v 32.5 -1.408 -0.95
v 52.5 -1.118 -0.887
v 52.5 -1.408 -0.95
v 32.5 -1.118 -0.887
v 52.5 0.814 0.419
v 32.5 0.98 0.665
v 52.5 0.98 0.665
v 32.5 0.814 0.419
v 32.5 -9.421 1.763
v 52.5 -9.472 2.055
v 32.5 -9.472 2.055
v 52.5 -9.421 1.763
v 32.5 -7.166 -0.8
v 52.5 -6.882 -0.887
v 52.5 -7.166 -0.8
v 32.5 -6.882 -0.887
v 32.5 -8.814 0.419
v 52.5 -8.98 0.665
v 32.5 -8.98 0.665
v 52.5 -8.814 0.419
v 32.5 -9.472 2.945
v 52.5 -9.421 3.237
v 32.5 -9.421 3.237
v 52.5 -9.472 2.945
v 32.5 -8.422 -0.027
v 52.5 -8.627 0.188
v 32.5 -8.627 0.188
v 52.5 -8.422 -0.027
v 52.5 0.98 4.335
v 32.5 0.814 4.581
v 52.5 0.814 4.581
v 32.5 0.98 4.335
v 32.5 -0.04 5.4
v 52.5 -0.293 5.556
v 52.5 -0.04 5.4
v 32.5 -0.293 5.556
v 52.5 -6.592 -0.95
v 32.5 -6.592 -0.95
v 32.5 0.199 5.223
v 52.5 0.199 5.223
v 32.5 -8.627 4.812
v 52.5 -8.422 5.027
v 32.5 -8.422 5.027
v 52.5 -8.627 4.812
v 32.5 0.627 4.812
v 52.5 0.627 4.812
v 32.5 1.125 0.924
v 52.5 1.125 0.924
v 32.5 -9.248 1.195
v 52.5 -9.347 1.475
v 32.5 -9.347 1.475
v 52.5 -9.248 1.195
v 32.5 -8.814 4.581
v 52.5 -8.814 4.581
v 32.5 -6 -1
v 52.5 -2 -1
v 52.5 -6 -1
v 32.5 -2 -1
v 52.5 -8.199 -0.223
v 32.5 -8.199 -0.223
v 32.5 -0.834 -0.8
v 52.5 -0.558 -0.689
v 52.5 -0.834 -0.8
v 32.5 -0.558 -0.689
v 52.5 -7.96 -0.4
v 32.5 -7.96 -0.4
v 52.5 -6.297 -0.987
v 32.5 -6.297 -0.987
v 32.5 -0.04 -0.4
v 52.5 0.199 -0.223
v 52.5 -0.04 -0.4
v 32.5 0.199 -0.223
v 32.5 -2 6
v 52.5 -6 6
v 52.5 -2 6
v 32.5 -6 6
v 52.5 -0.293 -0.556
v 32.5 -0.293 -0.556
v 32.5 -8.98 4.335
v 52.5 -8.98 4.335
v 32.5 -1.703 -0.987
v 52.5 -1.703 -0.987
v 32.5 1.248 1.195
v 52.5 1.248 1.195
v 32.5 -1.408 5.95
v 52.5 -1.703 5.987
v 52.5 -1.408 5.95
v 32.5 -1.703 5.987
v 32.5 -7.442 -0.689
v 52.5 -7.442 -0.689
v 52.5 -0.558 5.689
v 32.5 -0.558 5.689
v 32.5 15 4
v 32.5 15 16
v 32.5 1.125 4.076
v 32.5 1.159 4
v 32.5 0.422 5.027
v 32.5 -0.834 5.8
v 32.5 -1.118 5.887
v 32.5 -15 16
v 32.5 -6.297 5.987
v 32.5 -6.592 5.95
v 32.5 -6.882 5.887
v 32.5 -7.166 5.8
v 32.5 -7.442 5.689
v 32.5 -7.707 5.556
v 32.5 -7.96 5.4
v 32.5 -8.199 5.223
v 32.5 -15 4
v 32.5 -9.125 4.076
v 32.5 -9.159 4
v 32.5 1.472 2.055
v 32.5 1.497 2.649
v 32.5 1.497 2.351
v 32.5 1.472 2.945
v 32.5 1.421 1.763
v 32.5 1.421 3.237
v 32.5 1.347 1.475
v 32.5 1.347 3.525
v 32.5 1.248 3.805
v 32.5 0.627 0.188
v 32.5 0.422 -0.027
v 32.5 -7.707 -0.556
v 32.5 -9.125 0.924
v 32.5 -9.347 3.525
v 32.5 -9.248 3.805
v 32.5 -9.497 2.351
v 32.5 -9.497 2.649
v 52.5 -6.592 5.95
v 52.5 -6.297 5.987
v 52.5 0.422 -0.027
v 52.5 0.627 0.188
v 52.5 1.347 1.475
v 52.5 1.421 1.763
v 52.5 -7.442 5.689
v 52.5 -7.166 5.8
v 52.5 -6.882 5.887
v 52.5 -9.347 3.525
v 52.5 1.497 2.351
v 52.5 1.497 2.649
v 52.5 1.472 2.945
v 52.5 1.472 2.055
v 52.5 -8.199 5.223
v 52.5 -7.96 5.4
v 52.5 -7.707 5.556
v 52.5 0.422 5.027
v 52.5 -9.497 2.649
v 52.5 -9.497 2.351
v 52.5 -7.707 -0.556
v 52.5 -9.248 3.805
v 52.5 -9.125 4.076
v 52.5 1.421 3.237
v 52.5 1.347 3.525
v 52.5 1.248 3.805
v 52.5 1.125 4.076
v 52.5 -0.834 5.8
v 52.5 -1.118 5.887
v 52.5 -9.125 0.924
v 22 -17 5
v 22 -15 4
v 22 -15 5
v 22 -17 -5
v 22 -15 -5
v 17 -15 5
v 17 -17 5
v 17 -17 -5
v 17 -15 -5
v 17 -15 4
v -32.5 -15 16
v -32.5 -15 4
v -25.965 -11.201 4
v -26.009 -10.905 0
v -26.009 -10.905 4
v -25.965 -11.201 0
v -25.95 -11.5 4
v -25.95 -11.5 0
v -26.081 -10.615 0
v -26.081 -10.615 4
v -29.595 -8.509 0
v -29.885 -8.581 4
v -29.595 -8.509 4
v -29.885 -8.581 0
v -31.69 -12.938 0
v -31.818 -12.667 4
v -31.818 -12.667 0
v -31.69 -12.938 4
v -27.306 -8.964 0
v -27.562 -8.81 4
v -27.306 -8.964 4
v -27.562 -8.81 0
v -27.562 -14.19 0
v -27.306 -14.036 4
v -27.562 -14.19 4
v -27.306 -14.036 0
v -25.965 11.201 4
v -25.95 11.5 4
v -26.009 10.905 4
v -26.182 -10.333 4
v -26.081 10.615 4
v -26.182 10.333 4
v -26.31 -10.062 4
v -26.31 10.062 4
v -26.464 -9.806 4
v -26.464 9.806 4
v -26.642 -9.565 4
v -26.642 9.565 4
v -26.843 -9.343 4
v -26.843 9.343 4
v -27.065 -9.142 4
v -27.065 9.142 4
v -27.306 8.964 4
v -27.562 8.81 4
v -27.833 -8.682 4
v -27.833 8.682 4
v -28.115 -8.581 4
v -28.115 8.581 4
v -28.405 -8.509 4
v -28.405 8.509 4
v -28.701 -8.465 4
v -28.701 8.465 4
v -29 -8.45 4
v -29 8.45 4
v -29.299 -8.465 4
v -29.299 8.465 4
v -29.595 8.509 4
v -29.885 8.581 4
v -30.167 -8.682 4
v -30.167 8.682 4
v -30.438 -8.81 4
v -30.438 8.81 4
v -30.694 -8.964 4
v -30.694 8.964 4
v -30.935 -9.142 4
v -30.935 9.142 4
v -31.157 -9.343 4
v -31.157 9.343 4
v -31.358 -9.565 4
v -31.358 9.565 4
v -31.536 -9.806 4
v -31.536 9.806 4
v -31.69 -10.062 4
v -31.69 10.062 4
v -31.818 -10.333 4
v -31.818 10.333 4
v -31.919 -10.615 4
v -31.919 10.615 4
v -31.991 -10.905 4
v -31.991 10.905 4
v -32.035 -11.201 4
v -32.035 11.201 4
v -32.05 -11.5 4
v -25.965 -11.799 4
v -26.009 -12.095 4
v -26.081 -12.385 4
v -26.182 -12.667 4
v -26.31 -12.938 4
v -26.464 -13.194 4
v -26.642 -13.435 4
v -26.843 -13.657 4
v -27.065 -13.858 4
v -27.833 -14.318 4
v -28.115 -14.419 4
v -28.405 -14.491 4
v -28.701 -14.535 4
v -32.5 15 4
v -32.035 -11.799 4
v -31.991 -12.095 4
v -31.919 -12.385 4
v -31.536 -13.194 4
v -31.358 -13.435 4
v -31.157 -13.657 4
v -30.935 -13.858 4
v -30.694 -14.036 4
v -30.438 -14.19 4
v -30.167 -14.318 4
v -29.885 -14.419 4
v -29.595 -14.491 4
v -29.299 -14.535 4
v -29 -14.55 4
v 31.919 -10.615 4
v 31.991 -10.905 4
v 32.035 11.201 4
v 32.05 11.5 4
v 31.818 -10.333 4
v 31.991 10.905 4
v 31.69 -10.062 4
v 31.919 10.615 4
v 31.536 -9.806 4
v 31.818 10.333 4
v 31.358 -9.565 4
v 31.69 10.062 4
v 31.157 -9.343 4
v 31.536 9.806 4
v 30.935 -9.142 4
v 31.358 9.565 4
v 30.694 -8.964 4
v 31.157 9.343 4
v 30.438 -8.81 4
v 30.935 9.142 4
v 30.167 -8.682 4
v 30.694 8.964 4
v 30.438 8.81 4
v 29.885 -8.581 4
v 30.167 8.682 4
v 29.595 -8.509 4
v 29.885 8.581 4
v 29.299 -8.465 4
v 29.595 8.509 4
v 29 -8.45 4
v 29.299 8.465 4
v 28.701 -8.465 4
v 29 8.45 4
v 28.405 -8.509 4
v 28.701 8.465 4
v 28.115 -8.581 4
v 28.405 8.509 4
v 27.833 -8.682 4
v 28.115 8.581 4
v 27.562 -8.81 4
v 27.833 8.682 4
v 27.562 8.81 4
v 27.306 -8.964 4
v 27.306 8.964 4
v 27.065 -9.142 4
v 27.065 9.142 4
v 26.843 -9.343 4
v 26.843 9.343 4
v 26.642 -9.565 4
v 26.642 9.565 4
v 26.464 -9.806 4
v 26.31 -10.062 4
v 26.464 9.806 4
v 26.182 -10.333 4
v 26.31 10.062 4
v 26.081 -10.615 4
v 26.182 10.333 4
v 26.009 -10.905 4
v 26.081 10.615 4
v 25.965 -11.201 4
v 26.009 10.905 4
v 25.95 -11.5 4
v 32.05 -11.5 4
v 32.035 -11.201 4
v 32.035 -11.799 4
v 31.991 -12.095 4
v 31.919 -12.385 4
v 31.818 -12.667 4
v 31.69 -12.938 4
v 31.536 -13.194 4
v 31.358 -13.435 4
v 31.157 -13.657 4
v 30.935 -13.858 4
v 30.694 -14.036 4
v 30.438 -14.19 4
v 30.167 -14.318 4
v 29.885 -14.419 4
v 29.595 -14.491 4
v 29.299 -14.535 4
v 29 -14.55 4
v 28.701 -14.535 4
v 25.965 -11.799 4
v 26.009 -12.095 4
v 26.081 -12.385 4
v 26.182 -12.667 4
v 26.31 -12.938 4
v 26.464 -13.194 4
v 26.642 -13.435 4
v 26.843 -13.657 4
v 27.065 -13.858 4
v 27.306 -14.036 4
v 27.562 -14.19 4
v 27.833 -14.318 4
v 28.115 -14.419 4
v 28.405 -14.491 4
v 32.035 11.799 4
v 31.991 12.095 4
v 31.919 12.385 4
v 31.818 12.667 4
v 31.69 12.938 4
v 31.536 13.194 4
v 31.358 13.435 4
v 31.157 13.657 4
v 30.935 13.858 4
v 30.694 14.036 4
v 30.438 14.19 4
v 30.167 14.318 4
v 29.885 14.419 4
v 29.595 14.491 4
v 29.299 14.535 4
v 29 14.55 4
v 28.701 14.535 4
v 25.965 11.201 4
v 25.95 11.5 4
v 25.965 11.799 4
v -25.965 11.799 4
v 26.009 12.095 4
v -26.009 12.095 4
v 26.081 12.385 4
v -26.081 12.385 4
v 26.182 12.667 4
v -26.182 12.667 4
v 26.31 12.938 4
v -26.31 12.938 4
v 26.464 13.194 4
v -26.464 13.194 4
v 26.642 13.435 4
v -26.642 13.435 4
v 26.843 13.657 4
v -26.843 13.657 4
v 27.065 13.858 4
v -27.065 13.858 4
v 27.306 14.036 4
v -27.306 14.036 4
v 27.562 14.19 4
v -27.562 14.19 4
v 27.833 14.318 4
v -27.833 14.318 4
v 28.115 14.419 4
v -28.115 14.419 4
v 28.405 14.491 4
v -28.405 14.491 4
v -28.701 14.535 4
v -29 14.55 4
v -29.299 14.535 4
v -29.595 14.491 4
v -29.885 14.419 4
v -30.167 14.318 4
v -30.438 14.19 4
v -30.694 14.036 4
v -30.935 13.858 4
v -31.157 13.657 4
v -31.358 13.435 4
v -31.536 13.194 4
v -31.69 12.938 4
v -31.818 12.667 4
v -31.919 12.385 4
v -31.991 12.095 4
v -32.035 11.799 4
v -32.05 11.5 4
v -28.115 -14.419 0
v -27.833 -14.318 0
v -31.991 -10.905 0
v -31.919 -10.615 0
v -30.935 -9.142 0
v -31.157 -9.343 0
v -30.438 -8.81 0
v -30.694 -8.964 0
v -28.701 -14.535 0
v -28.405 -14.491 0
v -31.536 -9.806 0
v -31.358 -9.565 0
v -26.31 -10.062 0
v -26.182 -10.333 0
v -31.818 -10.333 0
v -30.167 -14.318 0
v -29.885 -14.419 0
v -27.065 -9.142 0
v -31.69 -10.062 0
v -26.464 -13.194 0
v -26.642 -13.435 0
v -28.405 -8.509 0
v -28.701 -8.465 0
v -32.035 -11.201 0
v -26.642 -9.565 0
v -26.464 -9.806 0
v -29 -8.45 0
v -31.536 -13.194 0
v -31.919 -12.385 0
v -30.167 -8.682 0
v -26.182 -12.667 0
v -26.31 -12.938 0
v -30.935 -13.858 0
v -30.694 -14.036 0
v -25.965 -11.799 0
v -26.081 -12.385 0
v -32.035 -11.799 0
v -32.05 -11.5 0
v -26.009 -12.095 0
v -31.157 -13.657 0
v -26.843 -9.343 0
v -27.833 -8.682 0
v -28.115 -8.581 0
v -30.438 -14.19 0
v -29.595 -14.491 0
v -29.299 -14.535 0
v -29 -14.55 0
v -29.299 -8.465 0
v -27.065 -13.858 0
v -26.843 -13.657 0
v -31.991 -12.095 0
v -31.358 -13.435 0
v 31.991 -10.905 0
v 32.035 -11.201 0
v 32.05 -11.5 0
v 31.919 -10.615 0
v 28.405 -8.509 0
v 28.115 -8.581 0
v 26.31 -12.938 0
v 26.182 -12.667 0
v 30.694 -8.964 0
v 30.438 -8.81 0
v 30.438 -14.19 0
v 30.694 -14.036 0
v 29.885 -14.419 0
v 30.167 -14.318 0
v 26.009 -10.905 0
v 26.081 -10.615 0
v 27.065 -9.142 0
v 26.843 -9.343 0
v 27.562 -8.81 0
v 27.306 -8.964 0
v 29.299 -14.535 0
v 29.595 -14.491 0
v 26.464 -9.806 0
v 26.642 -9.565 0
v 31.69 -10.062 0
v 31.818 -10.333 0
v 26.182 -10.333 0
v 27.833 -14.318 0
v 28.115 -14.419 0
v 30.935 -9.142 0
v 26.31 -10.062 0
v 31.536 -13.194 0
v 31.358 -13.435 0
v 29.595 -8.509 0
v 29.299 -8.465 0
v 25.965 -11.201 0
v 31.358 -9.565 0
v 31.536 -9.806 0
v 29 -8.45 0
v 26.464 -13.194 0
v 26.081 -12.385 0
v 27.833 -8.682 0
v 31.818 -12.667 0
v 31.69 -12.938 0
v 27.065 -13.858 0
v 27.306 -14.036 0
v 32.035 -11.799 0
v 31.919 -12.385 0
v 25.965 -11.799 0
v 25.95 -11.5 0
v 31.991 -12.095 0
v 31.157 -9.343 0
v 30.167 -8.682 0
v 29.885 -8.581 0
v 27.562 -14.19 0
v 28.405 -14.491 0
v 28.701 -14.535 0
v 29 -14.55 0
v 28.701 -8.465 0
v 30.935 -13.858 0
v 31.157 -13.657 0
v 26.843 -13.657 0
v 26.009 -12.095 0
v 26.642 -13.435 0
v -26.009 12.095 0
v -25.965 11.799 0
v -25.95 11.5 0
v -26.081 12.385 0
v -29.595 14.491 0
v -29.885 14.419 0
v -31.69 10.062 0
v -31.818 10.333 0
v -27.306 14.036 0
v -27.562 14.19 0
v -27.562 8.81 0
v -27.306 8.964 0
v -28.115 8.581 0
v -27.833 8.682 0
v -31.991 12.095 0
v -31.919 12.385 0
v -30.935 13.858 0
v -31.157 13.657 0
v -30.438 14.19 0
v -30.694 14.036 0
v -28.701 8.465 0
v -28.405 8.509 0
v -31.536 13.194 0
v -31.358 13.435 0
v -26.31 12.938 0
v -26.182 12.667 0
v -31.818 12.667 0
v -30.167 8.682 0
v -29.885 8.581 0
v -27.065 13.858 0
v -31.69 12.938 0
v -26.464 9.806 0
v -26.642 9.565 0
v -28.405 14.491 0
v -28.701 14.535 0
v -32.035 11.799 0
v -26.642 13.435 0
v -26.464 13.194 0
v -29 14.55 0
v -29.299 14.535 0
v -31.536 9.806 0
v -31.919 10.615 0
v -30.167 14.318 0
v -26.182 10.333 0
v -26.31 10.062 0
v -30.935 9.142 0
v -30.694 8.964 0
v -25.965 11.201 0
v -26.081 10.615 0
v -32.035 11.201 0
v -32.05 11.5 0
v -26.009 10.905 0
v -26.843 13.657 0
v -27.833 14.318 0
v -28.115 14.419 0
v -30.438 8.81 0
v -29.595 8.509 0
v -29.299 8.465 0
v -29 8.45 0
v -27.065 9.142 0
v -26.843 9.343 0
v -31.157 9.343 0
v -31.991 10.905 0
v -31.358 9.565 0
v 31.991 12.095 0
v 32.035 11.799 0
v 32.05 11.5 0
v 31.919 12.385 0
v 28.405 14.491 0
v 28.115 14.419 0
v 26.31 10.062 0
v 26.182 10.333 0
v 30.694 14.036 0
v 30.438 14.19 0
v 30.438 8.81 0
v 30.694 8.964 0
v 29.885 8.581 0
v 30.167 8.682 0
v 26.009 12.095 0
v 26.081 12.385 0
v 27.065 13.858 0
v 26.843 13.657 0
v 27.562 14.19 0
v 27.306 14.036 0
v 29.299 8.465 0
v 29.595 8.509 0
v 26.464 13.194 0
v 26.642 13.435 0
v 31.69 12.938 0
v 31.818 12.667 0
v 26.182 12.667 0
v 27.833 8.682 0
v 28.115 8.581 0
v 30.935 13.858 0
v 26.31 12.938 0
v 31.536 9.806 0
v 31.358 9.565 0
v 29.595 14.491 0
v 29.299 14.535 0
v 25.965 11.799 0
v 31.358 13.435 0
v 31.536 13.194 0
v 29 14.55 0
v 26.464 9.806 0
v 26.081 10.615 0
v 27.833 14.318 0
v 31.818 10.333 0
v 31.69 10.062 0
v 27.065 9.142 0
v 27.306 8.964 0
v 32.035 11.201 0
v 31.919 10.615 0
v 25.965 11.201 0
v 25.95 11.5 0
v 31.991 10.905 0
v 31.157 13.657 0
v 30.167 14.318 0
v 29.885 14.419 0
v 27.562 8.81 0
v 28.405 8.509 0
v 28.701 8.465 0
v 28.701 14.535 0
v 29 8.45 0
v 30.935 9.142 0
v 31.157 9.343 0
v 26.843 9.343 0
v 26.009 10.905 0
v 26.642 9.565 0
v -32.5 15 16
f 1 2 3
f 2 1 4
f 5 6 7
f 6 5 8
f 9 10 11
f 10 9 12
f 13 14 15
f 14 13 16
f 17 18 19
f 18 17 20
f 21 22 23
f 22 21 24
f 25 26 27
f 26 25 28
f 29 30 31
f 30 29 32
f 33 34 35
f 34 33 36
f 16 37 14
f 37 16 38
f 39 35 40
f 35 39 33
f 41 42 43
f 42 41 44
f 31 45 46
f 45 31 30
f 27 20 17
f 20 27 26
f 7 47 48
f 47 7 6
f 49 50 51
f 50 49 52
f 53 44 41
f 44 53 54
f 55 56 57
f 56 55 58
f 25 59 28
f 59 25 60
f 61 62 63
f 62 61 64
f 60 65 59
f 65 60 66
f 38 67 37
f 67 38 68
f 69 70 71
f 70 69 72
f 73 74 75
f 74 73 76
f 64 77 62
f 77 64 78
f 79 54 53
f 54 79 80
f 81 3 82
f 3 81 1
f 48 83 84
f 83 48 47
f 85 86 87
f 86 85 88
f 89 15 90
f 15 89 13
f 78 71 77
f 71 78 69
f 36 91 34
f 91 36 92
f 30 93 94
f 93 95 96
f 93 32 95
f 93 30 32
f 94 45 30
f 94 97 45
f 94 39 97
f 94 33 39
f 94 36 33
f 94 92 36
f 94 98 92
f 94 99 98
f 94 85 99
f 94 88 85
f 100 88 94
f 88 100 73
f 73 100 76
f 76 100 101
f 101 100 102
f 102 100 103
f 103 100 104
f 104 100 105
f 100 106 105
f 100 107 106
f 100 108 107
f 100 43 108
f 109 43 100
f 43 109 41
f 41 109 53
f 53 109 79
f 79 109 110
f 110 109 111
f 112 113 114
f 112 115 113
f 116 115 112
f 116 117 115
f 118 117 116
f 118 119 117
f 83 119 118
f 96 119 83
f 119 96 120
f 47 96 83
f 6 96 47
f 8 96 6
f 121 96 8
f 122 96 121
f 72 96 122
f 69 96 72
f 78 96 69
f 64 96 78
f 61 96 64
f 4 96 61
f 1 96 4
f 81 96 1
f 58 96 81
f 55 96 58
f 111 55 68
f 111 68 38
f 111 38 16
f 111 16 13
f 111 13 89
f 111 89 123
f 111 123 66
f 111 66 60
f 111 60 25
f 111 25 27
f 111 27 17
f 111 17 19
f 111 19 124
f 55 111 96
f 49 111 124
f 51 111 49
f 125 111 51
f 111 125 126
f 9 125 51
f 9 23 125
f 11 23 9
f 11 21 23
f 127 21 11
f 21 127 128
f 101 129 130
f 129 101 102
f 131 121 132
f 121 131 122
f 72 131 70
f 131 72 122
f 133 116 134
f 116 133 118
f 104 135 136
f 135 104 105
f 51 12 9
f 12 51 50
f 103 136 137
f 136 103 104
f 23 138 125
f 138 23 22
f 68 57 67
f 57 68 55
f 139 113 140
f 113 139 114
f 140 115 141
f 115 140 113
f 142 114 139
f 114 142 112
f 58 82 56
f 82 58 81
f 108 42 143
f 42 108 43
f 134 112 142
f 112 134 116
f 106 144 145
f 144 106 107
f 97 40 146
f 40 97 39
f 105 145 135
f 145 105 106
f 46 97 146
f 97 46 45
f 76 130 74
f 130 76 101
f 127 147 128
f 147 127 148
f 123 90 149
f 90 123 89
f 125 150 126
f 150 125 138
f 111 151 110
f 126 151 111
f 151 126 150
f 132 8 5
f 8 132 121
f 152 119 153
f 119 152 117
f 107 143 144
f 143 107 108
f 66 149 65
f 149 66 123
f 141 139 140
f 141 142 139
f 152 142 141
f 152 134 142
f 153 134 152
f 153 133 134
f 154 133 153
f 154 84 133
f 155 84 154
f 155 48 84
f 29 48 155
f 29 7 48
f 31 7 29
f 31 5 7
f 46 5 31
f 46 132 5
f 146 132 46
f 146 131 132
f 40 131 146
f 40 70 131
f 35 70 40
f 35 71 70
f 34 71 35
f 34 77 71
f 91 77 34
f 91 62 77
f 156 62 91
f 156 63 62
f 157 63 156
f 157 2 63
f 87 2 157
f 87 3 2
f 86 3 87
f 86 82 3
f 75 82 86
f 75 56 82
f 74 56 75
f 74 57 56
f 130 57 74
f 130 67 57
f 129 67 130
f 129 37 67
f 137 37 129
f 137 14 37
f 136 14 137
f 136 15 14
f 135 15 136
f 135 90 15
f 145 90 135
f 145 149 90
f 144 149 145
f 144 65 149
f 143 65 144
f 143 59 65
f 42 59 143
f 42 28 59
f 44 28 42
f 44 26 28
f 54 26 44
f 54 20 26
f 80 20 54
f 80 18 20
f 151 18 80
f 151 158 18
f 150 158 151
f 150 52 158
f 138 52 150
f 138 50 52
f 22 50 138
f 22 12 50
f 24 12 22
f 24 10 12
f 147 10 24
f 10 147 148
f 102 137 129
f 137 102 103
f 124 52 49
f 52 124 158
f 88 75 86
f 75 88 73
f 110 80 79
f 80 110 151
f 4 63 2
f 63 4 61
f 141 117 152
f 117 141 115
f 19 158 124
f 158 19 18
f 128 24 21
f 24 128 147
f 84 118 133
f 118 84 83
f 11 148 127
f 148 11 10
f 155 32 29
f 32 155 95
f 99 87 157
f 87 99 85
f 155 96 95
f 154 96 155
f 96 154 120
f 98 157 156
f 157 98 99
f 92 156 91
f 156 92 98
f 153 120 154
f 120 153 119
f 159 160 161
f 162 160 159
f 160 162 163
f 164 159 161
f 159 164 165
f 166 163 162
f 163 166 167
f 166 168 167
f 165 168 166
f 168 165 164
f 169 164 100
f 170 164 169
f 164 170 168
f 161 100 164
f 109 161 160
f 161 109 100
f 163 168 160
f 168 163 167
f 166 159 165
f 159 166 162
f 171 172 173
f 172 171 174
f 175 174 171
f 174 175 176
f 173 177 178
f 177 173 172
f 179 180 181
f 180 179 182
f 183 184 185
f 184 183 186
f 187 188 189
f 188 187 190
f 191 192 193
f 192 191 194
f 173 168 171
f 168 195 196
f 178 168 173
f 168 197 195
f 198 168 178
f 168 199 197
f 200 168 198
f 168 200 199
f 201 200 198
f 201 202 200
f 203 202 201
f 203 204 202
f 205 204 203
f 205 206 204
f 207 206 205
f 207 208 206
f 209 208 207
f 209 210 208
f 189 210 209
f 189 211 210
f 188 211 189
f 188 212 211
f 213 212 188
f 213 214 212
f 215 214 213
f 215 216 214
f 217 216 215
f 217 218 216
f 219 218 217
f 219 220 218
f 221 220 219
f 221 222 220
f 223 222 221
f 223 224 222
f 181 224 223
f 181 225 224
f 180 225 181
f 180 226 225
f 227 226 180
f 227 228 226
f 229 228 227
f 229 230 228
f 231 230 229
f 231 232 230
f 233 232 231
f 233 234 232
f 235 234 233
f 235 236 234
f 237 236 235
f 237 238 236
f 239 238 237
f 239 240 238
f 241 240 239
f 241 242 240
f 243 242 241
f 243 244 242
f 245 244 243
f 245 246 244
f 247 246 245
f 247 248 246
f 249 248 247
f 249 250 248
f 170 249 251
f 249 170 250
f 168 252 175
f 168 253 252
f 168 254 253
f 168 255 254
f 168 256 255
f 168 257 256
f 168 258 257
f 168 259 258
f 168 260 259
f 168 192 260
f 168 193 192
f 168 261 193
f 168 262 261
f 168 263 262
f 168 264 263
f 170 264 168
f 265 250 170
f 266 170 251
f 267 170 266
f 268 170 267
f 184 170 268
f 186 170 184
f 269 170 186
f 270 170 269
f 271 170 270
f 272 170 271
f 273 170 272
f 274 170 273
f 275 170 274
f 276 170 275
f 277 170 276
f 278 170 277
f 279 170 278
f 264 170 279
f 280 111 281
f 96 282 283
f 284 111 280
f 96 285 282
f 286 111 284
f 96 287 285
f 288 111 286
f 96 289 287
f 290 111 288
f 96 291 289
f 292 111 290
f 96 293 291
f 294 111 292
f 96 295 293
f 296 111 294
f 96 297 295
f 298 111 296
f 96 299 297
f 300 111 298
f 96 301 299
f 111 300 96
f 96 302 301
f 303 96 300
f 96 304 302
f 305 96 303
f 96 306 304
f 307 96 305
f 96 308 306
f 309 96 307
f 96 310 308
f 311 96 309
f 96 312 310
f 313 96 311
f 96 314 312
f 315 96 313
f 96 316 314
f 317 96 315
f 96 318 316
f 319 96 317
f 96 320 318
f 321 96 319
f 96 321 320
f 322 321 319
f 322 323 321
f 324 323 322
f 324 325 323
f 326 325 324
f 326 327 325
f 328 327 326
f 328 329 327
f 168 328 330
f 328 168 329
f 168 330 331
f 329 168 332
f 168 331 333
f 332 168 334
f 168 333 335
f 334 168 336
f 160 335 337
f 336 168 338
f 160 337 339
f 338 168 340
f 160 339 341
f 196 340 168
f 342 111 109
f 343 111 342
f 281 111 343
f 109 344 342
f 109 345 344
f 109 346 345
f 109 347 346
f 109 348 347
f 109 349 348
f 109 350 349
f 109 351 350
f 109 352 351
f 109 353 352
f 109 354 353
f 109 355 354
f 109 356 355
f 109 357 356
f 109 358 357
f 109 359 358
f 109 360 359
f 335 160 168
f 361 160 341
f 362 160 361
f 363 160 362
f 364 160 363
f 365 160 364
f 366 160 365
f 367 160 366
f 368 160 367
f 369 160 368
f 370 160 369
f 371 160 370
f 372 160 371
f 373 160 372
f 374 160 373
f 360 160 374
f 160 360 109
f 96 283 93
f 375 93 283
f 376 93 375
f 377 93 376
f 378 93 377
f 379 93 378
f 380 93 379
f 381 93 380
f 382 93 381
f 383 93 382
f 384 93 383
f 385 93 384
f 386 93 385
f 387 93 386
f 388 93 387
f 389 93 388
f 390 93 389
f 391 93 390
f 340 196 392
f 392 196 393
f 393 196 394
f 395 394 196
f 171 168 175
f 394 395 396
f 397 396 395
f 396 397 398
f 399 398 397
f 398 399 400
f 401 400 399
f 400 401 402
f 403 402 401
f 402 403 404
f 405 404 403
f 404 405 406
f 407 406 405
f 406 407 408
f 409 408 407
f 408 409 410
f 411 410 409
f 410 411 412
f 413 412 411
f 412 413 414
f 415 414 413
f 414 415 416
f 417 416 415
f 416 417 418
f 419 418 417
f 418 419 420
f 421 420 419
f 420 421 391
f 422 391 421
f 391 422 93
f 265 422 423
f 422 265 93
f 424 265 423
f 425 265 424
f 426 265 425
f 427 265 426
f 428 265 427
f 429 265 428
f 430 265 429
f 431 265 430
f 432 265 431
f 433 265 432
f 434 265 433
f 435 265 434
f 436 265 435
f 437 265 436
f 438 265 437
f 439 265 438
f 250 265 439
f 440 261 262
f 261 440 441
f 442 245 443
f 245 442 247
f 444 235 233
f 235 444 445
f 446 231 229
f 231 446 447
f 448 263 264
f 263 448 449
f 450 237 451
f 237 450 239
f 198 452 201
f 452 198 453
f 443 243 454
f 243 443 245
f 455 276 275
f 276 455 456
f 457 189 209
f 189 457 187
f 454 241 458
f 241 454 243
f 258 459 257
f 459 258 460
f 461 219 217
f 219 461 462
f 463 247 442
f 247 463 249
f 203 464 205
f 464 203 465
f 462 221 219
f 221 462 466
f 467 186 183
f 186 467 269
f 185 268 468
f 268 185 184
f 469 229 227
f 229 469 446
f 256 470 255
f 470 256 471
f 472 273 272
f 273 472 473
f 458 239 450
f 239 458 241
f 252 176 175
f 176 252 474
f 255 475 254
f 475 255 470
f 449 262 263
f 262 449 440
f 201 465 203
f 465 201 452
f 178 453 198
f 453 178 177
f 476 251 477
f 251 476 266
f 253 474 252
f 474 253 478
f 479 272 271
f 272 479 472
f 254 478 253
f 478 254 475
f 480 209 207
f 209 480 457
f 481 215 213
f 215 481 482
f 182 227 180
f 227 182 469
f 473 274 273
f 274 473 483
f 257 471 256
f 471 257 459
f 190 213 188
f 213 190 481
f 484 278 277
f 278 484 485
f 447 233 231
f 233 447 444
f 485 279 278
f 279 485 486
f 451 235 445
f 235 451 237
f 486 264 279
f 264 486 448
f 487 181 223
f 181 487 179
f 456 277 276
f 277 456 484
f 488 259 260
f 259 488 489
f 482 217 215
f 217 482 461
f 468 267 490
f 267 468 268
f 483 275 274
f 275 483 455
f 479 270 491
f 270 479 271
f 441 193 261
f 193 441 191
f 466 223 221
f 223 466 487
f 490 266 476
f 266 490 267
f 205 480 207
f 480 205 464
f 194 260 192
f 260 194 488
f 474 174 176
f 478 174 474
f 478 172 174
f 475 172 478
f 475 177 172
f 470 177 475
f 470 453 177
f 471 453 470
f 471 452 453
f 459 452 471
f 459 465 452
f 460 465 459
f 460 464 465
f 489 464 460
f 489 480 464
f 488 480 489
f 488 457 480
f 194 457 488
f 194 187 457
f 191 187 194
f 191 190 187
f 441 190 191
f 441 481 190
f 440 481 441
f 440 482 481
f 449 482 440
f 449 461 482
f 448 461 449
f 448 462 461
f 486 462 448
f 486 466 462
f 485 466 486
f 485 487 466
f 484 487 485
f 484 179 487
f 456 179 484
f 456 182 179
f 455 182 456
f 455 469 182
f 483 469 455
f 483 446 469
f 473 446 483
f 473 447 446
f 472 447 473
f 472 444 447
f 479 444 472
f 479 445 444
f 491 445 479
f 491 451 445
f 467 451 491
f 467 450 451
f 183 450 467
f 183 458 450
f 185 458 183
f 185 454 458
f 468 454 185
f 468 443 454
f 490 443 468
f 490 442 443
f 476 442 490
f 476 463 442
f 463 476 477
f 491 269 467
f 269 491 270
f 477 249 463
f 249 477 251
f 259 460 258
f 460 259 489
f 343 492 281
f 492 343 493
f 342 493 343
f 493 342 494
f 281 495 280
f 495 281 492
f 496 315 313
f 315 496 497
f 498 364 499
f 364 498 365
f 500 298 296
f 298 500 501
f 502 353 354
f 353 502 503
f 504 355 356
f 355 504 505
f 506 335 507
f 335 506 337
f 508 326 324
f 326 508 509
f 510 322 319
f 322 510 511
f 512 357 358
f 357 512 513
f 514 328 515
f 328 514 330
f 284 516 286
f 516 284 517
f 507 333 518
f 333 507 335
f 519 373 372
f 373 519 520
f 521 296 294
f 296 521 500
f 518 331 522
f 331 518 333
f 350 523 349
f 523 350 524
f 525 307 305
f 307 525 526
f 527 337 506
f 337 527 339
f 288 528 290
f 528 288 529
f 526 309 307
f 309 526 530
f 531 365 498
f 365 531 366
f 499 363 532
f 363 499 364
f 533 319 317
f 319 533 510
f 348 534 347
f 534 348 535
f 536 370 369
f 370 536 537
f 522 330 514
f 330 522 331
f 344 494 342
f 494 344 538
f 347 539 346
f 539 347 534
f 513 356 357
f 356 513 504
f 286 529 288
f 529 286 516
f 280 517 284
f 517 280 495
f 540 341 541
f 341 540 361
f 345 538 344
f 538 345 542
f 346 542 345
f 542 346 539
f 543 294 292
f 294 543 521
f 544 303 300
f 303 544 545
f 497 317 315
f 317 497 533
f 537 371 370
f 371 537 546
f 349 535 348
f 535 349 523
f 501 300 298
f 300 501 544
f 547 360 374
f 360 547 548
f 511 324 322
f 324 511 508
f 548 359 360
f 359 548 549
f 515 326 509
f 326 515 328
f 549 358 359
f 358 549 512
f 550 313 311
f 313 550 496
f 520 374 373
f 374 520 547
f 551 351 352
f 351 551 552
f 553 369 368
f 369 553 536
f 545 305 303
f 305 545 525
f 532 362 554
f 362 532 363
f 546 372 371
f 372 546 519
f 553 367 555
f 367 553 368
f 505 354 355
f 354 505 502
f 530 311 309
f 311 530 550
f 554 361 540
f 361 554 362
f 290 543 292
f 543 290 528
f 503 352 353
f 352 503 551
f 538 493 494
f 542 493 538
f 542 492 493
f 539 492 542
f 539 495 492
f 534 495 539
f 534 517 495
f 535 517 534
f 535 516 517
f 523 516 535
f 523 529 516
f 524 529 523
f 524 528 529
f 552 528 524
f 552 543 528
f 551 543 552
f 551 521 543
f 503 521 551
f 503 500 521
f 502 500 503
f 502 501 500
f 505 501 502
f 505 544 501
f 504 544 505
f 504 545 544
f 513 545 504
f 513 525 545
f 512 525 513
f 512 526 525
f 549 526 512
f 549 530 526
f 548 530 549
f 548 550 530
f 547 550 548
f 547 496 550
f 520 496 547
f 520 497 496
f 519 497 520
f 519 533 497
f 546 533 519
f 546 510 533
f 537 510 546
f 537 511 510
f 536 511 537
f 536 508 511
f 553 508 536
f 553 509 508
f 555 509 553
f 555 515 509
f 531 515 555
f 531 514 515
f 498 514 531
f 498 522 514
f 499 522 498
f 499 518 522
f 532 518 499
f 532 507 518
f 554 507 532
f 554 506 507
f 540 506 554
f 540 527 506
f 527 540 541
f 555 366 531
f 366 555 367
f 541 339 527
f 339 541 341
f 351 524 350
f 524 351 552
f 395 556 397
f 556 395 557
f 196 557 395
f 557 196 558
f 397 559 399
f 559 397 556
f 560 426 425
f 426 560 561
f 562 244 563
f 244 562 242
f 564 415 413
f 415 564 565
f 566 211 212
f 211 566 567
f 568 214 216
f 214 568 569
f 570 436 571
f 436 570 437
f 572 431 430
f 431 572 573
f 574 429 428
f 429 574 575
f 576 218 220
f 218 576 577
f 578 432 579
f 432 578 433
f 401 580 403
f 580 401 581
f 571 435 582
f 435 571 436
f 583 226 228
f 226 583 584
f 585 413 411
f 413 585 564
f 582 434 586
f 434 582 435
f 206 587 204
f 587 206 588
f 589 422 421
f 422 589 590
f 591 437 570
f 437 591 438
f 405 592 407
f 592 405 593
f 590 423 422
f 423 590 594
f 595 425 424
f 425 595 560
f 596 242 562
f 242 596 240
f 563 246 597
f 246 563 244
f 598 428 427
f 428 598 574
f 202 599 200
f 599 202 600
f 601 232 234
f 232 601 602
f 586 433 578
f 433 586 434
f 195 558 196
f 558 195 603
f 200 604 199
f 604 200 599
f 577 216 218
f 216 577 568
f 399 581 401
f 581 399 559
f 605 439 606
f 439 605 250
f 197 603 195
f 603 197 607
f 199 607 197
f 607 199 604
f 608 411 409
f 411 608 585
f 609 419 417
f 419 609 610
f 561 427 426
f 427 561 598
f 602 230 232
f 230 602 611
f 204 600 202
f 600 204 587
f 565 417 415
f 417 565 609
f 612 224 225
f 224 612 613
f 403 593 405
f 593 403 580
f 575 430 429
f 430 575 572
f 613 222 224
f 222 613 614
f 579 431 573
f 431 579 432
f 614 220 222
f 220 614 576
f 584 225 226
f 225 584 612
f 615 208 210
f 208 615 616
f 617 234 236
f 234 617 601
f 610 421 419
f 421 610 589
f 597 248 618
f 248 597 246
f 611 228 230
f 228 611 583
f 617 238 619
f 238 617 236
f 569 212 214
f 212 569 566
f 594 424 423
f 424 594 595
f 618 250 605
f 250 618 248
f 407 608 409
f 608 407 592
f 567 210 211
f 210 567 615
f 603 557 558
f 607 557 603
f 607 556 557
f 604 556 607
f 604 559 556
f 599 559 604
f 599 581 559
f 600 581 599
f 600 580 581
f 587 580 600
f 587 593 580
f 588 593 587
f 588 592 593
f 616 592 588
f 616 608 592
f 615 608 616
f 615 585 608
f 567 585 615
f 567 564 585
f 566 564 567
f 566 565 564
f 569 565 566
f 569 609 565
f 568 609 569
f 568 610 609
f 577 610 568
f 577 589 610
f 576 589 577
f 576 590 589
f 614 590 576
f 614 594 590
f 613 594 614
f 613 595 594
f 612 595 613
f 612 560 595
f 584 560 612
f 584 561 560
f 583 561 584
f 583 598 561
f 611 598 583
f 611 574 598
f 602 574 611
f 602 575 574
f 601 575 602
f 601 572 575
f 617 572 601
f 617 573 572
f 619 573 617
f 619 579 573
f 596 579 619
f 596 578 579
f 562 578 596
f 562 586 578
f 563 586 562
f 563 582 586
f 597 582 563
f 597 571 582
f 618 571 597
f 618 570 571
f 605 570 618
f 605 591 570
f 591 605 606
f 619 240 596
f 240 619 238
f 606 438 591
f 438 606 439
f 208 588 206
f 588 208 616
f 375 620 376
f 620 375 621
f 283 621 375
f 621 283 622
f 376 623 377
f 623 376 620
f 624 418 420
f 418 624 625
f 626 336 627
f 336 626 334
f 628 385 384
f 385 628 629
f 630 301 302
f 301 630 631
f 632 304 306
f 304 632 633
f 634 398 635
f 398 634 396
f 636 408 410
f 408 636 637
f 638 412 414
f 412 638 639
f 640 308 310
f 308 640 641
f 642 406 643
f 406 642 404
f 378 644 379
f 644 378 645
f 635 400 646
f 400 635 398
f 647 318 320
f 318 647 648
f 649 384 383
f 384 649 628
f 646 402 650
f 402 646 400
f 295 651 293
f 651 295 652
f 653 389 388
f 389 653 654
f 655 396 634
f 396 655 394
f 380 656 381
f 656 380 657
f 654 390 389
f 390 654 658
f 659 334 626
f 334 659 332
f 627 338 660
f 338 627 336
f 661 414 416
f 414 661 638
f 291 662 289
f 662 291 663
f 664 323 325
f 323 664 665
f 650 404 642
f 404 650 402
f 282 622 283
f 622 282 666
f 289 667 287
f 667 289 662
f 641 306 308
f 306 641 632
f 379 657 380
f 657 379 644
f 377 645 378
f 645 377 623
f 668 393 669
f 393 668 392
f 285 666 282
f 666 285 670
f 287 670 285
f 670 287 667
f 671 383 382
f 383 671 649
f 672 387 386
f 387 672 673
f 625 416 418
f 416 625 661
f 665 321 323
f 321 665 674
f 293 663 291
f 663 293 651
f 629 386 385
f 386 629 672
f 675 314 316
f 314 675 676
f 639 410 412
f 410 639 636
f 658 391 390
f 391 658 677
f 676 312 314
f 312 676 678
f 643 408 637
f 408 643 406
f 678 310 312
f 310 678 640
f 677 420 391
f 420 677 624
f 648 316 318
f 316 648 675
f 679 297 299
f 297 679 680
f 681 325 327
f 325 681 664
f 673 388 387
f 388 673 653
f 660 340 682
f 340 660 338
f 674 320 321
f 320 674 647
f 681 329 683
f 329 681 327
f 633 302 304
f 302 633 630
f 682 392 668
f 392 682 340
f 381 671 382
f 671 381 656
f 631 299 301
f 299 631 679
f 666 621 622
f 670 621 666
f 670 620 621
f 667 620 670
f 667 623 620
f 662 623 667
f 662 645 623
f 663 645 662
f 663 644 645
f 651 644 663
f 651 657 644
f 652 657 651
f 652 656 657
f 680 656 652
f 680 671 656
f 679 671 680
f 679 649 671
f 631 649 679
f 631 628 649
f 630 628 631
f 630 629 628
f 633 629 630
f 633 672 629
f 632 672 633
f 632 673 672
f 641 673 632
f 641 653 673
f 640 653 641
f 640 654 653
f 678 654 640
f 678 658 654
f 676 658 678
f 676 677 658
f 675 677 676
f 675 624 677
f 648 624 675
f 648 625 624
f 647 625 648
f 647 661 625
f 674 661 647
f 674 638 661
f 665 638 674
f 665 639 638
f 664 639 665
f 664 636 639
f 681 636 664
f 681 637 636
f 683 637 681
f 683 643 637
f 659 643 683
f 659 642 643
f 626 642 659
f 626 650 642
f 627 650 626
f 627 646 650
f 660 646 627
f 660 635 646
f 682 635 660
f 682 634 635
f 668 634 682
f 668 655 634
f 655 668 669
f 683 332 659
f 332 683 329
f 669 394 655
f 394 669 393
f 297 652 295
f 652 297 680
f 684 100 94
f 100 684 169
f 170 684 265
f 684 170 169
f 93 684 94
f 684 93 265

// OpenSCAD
// file: standards.scad
// BEARING:
BEARINGD = 11;
BEARINGT = 4;
BEARINGAXLED= 5;

// BOLTS:
BOLT3TIGHT=2.8;
BOLT3LOOSE=3.05;
BOLT25TIGHT = 2.35;

// GEARS:
GEART = 6;
GEARMODUL = 1;
HELIXANGLE=45;

$fn = 0; //50000;
$fa = 1;
$fs = .3;
// file: utils.scad
include <standards.scad>;

module bolt(h, d, sink, baseL=5){
   	
	// Expand the bolt sink hole by this amount: 
	sinkExpFac = 1.1;
	
	// Gray bolts
    	color("Gray")
    	translate([0,0,sink])
    	union(){
	// bolt thread
    	translate([0,0,d/2]) cylinder(h=h, r=d/2);
	// bolt base
    	cylinder(h=d/2, r1=d*sinkExpFac, r2=d/2*sinkExpFac);
    	translate([0,0,-baseL - sink]) cylinder(h=baseL + sink, r=d*sinkExpFac);
    	}
}
// main file
use <utils.scad>;
include <standards.scad>;

module rpizero(key, H=5, T=2){
	
	dims = [65,30,T];
	mount_holes = [[3.5, 3.5], [dims[0]-3.5, 3.5],
		       [3.5, dims[1]-3.5], [dims[0]-3.5, dims[1]-3.5]];
	module board(){
		translate([0,0,dims[2]/2]) cube(dims, center=true);
	}
	
	module mountpoles(H=H, key="poles"){
		translate([-dims[0]/2, -dims[1]/2, 0])
		for (p=mount_holes){
			translate(p)
			if (key=="poles"){
				translate([0,0, -H]) {
				cylinder(h=H, r=BOLT3LOOSE);
				//cylinder(h=H+dims[2]+1, r1=2.75/2, r2=2.6/2);
}
			}
			else if (key=="bolts"){
				mirror([0,0,1]) bolt(H+dims[2],BOLT3TIGHT, 0);
			}
		}
	}
	
	module usbcharge(){
		dy = 2.;
		translate([dims[0]/2, -dims[1]/2+11, -1.5])
		hull(){
		for (j=[-1,1]) translate([0, j*dy, 0]) rotate([0,90,0]) cylinder(h=20, r=3.5);
		}
	}
	
	module pwrswitch(){
		translate([dims[0]/2 - 15.5, -dims[1]/2 - 2, -H-5]) cube([5, 2, 10]);
	}
	
	translate([0,0,H])
	if (key=="boardpoles"){
		board();
		mountpoles();
	}
	else if (key=="poles"){
		mountpoles();
	}
	else if (key=="bolts"){
		mountpoles(key="bolts");
	}
	else if (key=="cuts"){
		usbcharge();
		pwrswitch();
	}
}

rpizero("cuts", H=4, T=12);
rpizero("boardpoles", H=4, T=12);
